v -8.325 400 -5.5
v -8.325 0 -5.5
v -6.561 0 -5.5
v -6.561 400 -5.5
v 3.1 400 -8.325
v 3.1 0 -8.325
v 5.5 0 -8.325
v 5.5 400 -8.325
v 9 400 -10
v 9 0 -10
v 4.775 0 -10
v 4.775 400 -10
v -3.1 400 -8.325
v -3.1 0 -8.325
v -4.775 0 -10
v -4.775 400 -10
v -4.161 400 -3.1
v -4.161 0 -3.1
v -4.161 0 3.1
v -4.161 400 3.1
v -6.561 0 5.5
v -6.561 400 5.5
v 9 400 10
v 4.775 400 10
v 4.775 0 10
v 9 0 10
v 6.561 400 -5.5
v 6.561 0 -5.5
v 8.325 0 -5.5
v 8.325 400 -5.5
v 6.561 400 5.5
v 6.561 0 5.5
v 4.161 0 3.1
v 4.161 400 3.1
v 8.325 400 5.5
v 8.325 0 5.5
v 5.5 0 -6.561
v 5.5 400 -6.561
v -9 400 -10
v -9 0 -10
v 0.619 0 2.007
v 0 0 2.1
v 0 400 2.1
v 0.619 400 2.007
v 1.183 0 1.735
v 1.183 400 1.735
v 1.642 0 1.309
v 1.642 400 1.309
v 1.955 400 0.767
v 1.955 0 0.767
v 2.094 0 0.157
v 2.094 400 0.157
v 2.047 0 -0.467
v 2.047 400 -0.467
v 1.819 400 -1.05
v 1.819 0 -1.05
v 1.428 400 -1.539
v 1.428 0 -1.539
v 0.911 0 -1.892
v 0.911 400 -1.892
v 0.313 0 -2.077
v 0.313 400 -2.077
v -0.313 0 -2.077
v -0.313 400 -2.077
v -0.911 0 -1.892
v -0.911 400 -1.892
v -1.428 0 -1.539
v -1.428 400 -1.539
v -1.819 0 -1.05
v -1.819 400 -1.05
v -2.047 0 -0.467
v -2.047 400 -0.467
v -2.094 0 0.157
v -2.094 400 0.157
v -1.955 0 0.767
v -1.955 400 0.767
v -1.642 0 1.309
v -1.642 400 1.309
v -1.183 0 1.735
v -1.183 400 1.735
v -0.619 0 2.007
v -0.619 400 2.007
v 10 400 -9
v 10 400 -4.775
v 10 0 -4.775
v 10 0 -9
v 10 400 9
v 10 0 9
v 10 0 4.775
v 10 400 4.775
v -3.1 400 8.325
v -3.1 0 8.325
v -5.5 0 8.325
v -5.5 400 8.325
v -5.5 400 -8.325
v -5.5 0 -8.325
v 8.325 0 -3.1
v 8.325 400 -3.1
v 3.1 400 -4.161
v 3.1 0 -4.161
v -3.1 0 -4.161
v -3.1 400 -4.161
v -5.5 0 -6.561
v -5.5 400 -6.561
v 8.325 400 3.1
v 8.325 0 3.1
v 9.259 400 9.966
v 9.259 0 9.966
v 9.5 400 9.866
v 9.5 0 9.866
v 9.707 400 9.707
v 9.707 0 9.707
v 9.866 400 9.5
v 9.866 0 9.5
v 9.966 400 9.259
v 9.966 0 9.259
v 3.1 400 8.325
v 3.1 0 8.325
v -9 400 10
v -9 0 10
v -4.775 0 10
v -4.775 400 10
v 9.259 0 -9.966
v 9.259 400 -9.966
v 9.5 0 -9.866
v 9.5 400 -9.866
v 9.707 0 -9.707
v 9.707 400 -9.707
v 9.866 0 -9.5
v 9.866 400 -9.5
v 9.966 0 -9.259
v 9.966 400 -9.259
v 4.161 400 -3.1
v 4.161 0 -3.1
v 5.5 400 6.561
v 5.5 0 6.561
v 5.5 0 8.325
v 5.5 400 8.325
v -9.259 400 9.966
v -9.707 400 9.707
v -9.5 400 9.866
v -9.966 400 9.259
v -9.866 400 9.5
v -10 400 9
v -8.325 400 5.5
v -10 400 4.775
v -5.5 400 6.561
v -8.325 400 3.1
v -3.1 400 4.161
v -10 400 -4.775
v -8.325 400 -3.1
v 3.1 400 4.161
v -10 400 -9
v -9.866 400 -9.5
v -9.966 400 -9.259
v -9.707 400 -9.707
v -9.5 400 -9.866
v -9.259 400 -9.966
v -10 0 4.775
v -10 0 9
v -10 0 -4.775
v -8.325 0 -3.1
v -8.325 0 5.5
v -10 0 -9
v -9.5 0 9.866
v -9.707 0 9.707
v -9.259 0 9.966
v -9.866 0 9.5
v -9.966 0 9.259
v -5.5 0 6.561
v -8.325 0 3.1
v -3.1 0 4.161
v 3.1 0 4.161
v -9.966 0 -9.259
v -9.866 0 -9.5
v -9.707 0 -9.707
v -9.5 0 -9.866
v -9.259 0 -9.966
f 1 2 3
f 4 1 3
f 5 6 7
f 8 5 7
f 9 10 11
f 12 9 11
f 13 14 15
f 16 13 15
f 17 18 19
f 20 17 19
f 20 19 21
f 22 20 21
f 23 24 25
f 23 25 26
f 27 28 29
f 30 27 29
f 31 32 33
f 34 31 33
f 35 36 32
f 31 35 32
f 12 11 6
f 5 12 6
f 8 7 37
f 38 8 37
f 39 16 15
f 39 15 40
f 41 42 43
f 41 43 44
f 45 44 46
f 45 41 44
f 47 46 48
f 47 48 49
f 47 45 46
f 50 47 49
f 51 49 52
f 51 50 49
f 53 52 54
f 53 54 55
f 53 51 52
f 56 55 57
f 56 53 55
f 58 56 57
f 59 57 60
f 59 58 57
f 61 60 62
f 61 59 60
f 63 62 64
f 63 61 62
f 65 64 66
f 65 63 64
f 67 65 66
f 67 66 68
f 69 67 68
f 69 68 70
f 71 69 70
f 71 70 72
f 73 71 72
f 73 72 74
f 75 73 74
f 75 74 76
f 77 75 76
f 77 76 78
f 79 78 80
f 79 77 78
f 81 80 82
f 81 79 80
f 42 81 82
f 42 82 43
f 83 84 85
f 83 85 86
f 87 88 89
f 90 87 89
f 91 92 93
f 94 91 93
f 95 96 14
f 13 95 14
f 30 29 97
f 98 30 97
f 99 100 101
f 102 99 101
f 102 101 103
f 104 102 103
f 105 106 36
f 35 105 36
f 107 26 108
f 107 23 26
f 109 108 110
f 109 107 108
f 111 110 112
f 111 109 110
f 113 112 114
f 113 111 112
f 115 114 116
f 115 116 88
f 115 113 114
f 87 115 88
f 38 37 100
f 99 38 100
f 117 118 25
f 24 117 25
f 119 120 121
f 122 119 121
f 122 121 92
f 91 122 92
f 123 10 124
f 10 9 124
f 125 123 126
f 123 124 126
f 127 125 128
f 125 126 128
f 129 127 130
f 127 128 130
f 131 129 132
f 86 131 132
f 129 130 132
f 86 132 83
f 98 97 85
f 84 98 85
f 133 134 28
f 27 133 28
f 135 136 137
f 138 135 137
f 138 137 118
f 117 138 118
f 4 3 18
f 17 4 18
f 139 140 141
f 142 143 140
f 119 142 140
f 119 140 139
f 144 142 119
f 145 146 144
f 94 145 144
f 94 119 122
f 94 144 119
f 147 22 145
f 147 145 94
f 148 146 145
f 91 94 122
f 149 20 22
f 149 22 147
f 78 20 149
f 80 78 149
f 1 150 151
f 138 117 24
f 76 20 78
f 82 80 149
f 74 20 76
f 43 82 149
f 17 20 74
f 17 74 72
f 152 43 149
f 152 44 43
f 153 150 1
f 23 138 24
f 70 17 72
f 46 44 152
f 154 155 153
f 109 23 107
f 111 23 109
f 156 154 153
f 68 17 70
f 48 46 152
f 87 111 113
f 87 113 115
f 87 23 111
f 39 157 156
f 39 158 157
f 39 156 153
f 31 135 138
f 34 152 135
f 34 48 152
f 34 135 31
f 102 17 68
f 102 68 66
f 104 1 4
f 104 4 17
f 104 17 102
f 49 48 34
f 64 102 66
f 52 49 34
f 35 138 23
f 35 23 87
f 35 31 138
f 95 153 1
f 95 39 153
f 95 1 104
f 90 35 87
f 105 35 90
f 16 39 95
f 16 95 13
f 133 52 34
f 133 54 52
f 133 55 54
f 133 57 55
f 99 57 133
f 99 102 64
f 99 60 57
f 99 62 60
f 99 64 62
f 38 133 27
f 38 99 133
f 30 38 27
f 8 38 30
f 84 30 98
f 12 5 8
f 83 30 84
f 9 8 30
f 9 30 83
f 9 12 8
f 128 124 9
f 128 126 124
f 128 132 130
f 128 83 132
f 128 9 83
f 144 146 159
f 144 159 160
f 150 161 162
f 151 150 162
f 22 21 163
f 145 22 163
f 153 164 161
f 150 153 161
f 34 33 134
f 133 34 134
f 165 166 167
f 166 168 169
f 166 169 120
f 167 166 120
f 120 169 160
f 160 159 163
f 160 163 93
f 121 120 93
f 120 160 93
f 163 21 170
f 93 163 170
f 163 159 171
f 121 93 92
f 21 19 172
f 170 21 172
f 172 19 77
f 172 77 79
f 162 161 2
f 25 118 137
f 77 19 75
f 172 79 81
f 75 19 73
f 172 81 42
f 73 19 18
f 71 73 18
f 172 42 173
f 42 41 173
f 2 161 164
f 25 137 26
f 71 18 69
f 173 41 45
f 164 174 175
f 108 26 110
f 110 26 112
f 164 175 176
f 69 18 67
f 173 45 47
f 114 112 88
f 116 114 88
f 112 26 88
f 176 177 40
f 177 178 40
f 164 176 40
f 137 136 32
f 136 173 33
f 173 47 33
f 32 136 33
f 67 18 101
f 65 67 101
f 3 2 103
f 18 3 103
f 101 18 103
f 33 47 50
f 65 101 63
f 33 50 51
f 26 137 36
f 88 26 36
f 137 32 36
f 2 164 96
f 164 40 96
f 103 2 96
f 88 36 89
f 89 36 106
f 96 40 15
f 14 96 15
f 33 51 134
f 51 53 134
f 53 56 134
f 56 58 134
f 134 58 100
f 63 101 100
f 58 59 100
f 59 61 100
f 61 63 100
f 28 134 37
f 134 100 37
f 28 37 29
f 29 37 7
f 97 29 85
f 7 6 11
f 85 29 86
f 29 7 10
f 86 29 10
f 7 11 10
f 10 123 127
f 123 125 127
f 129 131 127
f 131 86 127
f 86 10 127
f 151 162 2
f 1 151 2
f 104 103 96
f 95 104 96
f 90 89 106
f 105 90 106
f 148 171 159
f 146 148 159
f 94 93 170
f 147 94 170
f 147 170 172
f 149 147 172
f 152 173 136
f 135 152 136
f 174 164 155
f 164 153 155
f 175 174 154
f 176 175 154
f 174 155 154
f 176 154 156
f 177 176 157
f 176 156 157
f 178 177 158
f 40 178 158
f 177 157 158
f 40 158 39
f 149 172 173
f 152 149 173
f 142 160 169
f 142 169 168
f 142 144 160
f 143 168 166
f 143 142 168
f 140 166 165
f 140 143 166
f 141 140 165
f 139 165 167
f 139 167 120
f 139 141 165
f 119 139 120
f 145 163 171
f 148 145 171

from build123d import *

# Parameters (mm, degrees)
MASTERLAYOUTSKETCH_R = 2.1
MAIN_EXTRUSION_DEPTH = 400
EDGE_FILLETS_R       = 1


with BuildPart() as part:
    # MasterLayoutSketch → Main Extrusion (new body)
    with BuildSketch(Plane(origin=(0, 0, 0), x_dir=(1, 0, 0), z_dir=(0, 1, 0))):
        Polygon((-8.325, 3.1), (-8.325, 5.5), (-6.560660172, 5.5), (-4.160660172, 3.1), (-4.160660172, -3.1), (-6.560660172, -5.5), (-8.325, -5.5), (-8.325, -3.1), (-10, -4.775), (-10, -10), (-4.775, -10), (-3.1, -8.325), (-5.5, -8.325), (-5.5, -6.560660172), (-3.1, -4.160660172), (3.1, -4.160660172), (5.5, -6.560660172), (5.5, -8.325), (3.1, -8.325), (4.775, -10), (10, -10), (10, -4.775), (8.325, -3.1), (8.325, -5.5), (6.560660172, -5.5), (4.160660172, -3.1), (4.160660172, 3.1), (6.560660172, 5.5), (8.325, 5.5), (8.325, 3.1), (10, 4.775), (10, 10), (4.775, 10), (3.1, 8.325), (5.5, 8.325), (5.5, 6.560660172), (3.1, 4.160660172), (-3.1, 4.160660172), (-5.5, 6.560660172), (-5.5, 8.325), (-3.1, 8.325), (-4.775, 10), (-10, 10), (-10, 4.775), align=None)
        with Locations(Location((0, 0, 0), (0, 0, 270))):
            Circle(MASTERLAYOUTSKETCH_R, mode=Mode.SUBTRACT)
    extrude(amount=MAIN_EXTRUSION_DEPTH)

    # Edge Fillets
    edge_fillets_edges = [part.edges().sort_by_distance(p)[0] for p in [
        (10, 200, -10),
        (10, 200, 10),
        (-10, 200, 10),
        (-10, 200, -10),
    ]]
    fillet(edge_fillets_edges, radius=EDGE_FILLETS_R)


solid = part.part
